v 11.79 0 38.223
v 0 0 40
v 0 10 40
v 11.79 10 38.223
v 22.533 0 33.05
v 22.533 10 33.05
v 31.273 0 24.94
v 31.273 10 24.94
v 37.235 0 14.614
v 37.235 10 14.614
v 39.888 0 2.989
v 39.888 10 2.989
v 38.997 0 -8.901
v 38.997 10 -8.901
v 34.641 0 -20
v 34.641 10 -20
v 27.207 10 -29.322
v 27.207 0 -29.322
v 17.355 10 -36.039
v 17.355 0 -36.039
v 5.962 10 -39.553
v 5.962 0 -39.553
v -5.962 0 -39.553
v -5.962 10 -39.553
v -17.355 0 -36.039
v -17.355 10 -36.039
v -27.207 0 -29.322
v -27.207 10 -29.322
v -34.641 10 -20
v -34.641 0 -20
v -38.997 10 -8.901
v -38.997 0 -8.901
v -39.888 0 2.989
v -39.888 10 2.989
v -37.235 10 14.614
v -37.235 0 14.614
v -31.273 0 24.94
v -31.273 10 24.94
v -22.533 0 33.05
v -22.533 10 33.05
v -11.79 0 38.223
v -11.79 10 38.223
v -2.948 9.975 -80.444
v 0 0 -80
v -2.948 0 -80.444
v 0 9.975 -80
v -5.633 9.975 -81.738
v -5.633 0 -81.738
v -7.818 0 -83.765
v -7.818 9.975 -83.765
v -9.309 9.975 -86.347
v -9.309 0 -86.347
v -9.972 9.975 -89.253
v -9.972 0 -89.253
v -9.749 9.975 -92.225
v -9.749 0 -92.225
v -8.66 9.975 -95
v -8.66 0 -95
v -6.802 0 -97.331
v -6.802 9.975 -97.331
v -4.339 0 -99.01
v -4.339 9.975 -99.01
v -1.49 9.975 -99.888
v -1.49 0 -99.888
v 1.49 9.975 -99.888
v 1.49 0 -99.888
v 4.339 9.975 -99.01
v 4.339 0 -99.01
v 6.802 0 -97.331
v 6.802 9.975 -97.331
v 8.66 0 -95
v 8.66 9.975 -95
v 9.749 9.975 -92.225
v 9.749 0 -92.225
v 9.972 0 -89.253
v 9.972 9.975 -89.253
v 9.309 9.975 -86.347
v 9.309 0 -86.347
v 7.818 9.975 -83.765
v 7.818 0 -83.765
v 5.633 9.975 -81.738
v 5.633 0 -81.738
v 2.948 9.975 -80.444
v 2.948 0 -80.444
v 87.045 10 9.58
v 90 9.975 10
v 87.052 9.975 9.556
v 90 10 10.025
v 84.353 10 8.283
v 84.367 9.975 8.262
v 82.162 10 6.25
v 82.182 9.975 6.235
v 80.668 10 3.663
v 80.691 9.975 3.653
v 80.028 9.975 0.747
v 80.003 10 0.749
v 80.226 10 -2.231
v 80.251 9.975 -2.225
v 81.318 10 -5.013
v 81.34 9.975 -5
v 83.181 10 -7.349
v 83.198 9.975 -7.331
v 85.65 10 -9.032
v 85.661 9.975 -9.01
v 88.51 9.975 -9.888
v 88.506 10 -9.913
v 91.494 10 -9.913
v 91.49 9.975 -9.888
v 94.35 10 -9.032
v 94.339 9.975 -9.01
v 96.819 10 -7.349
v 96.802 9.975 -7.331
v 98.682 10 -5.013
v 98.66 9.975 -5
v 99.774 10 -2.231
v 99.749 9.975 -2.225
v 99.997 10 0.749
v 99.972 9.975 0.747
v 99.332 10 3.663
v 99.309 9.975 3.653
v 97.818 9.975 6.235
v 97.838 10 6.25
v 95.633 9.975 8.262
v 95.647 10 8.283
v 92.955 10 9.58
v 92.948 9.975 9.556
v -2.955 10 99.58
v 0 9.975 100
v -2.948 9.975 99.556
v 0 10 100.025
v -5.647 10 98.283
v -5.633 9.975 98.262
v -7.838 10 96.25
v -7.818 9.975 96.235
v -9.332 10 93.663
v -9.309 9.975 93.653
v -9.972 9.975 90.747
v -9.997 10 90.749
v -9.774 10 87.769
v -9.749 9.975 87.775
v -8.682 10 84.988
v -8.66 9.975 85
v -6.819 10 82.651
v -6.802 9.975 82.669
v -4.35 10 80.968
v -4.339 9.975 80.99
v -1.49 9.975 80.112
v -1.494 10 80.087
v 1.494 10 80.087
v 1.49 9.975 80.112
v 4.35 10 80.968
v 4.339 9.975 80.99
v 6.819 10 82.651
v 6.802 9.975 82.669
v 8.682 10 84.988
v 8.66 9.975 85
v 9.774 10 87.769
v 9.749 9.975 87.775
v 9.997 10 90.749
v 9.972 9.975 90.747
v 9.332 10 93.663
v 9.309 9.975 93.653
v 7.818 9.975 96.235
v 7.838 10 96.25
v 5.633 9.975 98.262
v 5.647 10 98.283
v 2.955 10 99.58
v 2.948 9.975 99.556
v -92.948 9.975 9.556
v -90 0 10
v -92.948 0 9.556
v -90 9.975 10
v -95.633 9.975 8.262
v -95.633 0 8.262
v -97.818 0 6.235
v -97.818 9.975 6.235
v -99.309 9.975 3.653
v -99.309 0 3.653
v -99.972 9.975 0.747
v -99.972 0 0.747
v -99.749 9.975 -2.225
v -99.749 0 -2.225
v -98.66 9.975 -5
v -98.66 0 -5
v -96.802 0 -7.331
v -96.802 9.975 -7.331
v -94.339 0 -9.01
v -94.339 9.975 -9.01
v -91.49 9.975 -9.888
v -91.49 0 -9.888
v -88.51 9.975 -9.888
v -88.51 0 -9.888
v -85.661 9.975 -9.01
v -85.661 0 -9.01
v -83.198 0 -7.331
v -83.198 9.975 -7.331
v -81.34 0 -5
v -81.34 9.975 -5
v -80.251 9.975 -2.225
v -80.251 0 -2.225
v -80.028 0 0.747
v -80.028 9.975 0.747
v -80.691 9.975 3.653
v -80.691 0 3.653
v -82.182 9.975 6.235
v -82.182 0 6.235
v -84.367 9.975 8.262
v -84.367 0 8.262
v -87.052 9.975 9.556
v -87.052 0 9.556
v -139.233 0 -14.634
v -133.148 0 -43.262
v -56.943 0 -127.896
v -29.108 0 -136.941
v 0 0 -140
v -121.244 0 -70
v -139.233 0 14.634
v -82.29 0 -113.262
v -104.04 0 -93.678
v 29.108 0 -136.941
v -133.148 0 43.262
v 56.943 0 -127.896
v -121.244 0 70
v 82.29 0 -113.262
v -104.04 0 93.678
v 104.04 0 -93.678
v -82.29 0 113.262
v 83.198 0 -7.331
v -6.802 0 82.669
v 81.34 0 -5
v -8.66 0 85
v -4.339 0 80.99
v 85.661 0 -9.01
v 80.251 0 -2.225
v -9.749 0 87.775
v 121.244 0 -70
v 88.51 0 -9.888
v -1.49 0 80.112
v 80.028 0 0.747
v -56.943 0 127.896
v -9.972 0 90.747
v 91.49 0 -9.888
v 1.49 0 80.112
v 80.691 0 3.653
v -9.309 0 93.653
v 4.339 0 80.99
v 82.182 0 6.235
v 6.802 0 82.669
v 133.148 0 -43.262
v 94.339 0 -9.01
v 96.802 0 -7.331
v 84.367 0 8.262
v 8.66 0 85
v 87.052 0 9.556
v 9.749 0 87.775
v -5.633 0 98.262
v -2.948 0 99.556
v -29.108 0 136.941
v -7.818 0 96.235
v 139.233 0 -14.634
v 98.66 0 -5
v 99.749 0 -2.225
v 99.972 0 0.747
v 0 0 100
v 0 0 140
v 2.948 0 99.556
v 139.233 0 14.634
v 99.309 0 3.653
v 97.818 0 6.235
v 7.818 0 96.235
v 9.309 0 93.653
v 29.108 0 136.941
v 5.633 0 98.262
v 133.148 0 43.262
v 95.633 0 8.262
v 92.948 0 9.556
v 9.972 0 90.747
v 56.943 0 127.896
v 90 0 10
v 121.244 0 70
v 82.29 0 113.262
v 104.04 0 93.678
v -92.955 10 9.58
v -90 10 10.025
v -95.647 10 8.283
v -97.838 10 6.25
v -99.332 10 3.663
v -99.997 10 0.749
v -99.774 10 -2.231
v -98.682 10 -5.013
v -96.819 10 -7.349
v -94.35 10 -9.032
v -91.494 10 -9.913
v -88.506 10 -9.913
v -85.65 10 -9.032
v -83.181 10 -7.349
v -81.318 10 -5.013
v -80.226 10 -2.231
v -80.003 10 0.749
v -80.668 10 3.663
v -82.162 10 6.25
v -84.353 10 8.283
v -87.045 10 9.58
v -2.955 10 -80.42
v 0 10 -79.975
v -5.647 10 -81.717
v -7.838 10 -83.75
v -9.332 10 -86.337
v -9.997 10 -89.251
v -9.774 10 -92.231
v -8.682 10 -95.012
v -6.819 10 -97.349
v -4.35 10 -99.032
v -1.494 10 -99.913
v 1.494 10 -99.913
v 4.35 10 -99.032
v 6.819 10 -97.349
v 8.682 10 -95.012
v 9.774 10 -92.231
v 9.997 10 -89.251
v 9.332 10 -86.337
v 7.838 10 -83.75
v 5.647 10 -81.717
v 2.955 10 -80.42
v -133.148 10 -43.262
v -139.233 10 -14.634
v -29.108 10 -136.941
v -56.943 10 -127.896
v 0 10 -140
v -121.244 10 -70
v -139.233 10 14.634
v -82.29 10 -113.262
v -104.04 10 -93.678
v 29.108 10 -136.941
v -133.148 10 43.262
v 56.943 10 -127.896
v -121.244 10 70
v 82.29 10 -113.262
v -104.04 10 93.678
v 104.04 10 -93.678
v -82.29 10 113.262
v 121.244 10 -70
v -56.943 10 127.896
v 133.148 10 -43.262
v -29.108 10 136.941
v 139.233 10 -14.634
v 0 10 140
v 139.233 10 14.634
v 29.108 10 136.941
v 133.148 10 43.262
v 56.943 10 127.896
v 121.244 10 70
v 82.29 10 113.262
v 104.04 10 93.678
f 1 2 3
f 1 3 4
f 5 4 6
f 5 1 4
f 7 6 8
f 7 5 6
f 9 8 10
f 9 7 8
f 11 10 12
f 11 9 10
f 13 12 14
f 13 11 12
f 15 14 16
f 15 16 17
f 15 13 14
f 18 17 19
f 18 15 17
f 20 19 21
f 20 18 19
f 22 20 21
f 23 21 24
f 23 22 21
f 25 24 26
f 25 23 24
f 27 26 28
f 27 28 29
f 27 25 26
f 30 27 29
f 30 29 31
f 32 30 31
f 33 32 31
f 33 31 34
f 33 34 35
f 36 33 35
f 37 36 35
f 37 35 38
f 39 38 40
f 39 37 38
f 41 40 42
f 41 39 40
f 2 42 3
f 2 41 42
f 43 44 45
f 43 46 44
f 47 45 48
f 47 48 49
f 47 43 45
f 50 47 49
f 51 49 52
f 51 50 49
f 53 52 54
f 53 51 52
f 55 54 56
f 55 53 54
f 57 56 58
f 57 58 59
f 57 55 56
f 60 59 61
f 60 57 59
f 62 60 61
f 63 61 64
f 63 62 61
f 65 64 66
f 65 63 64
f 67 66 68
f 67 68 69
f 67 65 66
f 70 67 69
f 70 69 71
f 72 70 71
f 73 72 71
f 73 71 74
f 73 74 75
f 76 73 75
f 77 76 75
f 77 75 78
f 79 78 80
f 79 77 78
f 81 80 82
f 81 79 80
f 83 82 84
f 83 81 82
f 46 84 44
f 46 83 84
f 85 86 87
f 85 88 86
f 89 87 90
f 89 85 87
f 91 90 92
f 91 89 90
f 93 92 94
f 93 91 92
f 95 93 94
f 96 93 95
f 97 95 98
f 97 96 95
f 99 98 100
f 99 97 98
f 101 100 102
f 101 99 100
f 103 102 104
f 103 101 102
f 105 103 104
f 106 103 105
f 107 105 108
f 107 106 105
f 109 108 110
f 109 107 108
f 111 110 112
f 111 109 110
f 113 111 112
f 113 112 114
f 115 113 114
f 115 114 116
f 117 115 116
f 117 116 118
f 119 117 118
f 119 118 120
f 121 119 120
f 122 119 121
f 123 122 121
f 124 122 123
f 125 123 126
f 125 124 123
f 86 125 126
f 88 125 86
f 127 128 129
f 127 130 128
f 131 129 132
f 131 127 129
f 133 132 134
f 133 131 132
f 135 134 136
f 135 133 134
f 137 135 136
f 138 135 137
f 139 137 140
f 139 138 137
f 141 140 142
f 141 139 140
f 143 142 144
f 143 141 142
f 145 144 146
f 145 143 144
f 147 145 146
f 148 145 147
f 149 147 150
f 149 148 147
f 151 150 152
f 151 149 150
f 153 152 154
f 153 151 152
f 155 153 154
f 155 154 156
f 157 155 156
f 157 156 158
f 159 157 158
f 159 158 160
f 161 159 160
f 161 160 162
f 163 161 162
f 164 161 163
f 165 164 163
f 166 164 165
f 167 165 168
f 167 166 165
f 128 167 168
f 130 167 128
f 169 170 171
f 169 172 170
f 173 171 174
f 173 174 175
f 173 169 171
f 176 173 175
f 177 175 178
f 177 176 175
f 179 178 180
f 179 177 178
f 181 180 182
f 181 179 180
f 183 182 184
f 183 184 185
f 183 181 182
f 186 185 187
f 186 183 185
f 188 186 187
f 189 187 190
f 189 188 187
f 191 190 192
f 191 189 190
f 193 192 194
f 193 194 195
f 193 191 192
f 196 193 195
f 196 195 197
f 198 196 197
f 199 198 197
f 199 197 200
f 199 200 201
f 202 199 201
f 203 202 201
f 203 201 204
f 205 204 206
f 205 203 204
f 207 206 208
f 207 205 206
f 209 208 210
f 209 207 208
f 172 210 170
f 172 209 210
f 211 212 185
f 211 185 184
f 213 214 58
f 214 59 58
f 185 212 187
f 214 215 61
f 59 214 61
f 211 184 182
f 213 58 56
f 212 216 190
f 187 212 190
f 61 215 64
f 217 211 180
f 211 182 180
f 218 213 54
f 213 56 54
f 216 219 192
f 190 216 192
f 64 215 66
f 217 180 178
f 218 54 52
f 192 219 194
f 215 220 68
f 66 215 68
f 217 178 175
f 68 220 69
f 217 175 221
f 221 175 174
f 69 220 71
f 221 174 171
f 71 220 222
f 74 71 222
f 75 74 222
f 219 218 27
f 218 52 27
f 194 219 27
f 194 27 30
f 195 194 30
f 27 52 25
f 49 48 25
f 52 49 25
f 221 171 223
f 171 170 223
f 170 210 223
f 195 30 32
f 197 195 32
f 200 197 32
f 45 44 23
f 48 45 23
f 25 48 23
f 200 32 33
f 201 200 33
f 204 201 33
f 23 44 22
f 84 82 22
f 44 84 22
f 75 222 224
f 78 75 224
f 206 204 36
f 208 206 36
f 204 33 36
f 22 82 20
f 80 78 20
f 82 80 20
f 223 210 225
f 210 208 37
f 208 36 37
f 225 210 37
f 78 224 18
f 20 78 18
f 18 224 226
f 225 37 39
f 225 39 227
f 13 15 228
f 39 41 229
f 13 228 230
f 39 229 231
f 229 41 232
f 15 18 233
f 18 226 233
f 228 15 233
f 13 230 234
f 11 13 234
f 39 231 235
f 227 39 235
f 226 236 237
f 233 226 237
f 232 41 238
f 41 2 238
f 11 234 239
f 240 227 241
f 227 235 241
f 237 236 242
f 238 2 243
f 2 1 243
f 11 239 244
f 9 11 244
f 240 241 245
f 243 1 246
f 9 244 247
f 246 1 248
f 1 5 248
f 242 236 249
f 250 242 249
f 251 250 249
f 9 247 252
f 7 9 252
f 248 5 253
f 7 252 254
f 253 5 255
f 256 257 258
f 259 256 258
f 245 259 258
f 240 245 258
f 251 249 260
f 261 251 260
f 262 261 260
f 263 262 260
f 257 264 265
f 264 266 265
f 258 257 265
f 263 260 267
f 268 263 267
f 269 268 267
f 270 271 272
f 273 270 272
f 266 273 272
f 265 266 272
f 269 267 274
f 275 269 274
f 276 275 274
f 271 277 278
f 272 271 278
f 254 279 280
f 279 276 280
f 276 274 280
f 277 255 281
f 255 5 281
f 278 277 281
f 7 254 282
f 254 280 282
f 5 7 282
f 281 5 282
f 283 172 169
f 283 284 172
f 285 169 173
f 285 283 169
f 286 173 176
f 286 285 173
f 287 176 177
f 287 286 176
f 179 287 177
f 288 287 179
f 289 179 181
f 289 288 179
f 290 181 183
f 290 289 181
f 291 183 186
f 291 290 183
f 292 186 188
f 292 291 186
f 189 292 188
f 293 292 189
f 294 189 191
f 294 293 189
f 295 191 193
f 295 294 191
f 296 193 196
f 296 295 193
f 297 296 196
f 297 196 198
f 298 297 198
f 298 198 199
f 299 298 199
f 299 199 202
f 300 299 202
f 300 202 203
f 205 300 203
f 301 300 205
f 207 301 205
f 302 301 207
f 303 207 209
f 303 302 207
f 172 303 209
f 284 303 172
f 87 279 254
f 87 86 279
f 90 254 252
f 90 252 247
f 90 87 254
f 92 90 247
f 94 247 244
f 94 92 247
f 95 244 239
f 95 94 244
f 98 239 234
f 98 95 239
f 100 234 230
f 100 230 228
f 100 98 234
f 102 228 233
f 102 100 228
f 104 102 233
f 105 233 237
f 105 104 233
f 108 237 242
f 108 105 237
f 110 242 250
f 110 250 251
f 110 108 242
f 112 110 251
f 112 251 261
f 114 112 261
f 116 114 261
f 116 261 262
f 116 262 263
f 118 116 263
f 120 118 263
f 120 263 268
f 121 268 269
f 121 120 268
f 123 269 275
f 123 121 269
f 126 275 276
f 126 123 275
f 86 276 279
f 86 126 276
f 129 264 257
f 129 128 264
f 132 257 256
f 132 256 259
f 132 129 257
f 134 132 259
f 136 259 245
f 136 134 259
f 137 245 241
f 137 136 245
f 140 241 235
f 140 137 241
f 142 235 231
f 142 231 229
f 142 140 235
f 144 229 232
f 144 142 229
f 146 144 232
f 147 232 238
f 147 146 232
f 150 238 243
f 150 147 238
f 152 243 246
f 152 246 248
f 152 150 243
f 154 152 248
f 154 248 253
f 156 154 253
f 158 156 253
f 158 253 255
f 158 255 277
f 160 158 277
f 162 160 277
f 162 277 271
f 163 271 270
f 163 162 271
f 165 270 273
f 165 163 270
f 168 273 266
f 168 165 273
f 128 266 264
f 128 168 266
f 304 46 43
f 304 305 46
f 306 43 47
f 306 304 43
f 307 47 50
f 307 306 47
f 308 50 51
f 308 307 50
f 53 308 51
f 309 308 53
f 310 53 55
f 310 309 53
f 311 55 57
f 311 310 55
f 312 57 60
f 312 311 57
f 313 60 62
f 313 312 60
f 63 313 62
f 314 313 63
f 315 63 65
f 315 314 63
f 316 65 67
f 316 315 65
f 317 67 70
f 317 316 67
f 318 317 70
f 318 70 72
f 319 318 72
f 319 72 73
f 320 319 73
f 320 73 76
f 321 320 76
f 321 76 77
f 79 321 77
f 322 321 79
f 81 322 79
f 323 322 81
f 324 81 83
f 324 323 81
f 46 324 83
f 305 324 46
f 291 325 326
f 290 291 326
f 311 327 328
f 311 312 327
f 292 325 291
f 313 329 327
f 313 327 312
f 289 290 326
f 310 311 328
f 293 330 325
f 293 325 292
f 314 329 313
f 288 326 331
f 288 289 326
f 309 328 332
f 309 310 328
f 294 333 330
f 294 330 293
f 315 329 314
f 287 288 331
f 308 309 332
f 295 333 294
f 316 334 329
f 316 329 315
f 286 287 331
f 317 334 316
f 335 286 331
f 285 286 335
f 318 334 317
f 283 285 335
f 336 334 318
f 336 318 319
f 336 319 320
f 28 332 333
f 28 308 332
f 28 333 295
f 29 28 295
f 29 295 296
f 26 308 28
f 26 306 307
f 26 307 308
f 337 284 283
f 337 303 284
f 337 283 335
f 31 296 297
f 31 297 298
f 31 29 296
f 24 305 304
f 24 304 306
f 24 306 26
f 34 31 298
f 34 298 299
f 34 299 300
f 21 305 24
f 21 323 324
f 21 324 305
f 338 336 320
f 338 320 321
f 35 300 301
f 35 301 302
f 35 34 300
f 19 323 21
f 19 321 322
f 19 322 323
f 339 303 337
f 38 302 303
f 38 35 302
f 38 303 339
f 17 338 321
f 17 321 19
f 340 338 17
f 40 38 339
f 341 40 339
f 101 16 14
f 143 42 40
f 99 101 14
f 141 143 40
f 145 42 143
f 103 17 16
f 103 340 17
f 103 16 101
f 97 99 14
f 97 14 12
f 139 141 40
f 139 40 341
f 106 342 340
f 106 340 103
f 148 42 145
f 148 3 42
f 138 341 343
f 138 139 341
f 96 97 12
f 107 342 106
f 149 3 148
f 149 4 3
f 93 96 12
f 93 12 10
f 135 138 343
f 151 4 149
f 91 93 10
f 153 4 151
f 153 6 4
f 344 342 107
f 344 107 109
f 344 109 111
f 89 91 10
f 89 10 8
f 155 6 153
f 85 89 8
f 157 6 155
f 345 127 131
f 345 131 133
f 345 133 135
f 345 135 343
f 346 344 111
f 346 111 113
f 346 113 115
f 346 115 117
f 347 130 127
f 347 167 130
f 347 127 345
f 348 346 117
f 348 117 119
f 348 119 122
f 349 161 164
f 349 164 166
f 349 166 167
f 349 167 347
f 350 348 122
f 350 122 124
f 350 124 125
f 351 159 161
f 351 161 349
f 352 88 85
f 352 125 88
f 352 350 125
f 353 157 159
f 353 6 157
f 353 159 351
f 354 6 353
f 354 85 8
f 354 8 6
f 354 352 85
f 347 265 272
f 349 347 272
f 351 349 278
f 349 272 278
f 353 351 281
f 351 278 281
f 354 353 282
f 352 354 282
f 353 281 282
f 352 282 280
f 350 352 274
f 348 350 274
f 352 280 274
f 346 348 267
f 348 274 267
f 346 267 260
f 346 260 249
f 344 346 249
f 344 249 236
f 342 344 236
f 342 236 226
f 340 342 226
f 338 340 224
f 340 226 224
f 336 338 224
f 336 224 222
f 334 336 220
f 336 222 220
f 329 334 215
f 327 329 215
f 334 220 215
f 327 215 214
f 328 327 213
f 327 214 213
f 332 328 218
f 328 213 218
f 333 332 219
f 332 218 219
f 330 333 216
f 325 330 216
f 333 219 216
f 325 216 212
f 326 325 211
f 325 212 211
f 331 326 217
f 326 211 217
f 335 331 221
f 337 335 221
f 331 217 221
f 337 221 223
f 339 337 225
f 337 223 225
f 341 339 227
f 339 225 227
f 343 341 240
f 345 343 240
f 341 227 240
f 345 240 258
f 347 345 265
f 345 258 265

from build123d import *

# Parameters (mm, degrees)
SKETCH_1_R                       = 140
SKETCH_1_R_2                     = 40
EXTRUDE_1_DEPTH                  = 10
HOLE_WIZARD_20_0_20_1_AT_2_COUNT = 2
HOLE_WIZARD_20_0_20_1_AT_2_PITCH = 127.279220614
HOLE_WIZARD_20_0_20_1_AT_3_COUNT = 2
HOLE_WIZARD_20_0_20_1_AT_3_PITCH = 180
HOLE_WIZARD_20_0_20_1_AT_4_COUNT = 2
HOLE_WIZARD_20_0_20_1_AT_4_PITCH = 127.279220614


with BuildPart() as part:
    # 草图1 → 凸台-拉伸1 (new body)
    with BuildSketch(Plane(origin=(0, 0, 0), x_dir=(1, 0, 0), z_dir=(0, 1, 0))):
        Circle(SKETCH_1_R)
        Circle(SKETCH_1_R_2, mode=Mode.SUBTRACT)
    extrude(amount=EXTRUDE_1_DEPTH)

    # 草图3 → Ø20.0 (20) 直径孔1 (revolve, cut)
    with BuildSketch(Plane(origin=(0, 10, 90), x_dir=(0, 0, 1), z_dir=(1, 0, 0))):
        Polygon((0, 0), (0, 10), (10, 10), (10, 0.025), (10.025, 0), align=None)
    hole_wizard_20_0_20_1 = revolve(axis=Axis((0, 16.35, 90), (0, -1, 0)), mode=Mode.SUBTRACT)

    # Ø20.0 (20) 直径孔1 at 2: Ø20.0 (20) 直径孔1 ×2
    with Locations(*[Vector(0.7071067811865476, 0, -0.7071067811865476) * (i * HOLE_WIZARD_20_0_20_1_AT_2_PITCH) for i in range(1, HOLE_WIZARD_20_0_20_1_AT_2_COUNT)]):
        add(hole_wizard_20_0_20_1, mode=Mode.SUBTRACT)

    # Ø20.0 (20) 直径孔1 at 3: Ø20.0 (20) 直径孔1 ×2
    with Locations(*[(0, 0, -i * HOLE_WIZARD_20_0_20_1_AT_3_PITCH) for i in range(1, HOLE_WIZARD_20_0_20_1_AT_3_COUNT)]):
        add(hole_wizard_20_0_20_1, mode=Mode.SUBTRACT)

    # Ø20.0 (20) 直径孔1 at 4: Ø20.0 (20) 直径孔1 ×2
    with Locations(*[Vector(-0.7071067811865476, 0, -0.7071067811865476) * (i * HOLE_WIZARD_20_0_20_1_AT_4_PITCH) for i in range(1, HOLE_WIZARD_20_0_20_1_AT_4_COUNT)]):
        add(hole_wizard_20_0_20_1, mode=Mode.SUBTRACT)


solid = part.part
